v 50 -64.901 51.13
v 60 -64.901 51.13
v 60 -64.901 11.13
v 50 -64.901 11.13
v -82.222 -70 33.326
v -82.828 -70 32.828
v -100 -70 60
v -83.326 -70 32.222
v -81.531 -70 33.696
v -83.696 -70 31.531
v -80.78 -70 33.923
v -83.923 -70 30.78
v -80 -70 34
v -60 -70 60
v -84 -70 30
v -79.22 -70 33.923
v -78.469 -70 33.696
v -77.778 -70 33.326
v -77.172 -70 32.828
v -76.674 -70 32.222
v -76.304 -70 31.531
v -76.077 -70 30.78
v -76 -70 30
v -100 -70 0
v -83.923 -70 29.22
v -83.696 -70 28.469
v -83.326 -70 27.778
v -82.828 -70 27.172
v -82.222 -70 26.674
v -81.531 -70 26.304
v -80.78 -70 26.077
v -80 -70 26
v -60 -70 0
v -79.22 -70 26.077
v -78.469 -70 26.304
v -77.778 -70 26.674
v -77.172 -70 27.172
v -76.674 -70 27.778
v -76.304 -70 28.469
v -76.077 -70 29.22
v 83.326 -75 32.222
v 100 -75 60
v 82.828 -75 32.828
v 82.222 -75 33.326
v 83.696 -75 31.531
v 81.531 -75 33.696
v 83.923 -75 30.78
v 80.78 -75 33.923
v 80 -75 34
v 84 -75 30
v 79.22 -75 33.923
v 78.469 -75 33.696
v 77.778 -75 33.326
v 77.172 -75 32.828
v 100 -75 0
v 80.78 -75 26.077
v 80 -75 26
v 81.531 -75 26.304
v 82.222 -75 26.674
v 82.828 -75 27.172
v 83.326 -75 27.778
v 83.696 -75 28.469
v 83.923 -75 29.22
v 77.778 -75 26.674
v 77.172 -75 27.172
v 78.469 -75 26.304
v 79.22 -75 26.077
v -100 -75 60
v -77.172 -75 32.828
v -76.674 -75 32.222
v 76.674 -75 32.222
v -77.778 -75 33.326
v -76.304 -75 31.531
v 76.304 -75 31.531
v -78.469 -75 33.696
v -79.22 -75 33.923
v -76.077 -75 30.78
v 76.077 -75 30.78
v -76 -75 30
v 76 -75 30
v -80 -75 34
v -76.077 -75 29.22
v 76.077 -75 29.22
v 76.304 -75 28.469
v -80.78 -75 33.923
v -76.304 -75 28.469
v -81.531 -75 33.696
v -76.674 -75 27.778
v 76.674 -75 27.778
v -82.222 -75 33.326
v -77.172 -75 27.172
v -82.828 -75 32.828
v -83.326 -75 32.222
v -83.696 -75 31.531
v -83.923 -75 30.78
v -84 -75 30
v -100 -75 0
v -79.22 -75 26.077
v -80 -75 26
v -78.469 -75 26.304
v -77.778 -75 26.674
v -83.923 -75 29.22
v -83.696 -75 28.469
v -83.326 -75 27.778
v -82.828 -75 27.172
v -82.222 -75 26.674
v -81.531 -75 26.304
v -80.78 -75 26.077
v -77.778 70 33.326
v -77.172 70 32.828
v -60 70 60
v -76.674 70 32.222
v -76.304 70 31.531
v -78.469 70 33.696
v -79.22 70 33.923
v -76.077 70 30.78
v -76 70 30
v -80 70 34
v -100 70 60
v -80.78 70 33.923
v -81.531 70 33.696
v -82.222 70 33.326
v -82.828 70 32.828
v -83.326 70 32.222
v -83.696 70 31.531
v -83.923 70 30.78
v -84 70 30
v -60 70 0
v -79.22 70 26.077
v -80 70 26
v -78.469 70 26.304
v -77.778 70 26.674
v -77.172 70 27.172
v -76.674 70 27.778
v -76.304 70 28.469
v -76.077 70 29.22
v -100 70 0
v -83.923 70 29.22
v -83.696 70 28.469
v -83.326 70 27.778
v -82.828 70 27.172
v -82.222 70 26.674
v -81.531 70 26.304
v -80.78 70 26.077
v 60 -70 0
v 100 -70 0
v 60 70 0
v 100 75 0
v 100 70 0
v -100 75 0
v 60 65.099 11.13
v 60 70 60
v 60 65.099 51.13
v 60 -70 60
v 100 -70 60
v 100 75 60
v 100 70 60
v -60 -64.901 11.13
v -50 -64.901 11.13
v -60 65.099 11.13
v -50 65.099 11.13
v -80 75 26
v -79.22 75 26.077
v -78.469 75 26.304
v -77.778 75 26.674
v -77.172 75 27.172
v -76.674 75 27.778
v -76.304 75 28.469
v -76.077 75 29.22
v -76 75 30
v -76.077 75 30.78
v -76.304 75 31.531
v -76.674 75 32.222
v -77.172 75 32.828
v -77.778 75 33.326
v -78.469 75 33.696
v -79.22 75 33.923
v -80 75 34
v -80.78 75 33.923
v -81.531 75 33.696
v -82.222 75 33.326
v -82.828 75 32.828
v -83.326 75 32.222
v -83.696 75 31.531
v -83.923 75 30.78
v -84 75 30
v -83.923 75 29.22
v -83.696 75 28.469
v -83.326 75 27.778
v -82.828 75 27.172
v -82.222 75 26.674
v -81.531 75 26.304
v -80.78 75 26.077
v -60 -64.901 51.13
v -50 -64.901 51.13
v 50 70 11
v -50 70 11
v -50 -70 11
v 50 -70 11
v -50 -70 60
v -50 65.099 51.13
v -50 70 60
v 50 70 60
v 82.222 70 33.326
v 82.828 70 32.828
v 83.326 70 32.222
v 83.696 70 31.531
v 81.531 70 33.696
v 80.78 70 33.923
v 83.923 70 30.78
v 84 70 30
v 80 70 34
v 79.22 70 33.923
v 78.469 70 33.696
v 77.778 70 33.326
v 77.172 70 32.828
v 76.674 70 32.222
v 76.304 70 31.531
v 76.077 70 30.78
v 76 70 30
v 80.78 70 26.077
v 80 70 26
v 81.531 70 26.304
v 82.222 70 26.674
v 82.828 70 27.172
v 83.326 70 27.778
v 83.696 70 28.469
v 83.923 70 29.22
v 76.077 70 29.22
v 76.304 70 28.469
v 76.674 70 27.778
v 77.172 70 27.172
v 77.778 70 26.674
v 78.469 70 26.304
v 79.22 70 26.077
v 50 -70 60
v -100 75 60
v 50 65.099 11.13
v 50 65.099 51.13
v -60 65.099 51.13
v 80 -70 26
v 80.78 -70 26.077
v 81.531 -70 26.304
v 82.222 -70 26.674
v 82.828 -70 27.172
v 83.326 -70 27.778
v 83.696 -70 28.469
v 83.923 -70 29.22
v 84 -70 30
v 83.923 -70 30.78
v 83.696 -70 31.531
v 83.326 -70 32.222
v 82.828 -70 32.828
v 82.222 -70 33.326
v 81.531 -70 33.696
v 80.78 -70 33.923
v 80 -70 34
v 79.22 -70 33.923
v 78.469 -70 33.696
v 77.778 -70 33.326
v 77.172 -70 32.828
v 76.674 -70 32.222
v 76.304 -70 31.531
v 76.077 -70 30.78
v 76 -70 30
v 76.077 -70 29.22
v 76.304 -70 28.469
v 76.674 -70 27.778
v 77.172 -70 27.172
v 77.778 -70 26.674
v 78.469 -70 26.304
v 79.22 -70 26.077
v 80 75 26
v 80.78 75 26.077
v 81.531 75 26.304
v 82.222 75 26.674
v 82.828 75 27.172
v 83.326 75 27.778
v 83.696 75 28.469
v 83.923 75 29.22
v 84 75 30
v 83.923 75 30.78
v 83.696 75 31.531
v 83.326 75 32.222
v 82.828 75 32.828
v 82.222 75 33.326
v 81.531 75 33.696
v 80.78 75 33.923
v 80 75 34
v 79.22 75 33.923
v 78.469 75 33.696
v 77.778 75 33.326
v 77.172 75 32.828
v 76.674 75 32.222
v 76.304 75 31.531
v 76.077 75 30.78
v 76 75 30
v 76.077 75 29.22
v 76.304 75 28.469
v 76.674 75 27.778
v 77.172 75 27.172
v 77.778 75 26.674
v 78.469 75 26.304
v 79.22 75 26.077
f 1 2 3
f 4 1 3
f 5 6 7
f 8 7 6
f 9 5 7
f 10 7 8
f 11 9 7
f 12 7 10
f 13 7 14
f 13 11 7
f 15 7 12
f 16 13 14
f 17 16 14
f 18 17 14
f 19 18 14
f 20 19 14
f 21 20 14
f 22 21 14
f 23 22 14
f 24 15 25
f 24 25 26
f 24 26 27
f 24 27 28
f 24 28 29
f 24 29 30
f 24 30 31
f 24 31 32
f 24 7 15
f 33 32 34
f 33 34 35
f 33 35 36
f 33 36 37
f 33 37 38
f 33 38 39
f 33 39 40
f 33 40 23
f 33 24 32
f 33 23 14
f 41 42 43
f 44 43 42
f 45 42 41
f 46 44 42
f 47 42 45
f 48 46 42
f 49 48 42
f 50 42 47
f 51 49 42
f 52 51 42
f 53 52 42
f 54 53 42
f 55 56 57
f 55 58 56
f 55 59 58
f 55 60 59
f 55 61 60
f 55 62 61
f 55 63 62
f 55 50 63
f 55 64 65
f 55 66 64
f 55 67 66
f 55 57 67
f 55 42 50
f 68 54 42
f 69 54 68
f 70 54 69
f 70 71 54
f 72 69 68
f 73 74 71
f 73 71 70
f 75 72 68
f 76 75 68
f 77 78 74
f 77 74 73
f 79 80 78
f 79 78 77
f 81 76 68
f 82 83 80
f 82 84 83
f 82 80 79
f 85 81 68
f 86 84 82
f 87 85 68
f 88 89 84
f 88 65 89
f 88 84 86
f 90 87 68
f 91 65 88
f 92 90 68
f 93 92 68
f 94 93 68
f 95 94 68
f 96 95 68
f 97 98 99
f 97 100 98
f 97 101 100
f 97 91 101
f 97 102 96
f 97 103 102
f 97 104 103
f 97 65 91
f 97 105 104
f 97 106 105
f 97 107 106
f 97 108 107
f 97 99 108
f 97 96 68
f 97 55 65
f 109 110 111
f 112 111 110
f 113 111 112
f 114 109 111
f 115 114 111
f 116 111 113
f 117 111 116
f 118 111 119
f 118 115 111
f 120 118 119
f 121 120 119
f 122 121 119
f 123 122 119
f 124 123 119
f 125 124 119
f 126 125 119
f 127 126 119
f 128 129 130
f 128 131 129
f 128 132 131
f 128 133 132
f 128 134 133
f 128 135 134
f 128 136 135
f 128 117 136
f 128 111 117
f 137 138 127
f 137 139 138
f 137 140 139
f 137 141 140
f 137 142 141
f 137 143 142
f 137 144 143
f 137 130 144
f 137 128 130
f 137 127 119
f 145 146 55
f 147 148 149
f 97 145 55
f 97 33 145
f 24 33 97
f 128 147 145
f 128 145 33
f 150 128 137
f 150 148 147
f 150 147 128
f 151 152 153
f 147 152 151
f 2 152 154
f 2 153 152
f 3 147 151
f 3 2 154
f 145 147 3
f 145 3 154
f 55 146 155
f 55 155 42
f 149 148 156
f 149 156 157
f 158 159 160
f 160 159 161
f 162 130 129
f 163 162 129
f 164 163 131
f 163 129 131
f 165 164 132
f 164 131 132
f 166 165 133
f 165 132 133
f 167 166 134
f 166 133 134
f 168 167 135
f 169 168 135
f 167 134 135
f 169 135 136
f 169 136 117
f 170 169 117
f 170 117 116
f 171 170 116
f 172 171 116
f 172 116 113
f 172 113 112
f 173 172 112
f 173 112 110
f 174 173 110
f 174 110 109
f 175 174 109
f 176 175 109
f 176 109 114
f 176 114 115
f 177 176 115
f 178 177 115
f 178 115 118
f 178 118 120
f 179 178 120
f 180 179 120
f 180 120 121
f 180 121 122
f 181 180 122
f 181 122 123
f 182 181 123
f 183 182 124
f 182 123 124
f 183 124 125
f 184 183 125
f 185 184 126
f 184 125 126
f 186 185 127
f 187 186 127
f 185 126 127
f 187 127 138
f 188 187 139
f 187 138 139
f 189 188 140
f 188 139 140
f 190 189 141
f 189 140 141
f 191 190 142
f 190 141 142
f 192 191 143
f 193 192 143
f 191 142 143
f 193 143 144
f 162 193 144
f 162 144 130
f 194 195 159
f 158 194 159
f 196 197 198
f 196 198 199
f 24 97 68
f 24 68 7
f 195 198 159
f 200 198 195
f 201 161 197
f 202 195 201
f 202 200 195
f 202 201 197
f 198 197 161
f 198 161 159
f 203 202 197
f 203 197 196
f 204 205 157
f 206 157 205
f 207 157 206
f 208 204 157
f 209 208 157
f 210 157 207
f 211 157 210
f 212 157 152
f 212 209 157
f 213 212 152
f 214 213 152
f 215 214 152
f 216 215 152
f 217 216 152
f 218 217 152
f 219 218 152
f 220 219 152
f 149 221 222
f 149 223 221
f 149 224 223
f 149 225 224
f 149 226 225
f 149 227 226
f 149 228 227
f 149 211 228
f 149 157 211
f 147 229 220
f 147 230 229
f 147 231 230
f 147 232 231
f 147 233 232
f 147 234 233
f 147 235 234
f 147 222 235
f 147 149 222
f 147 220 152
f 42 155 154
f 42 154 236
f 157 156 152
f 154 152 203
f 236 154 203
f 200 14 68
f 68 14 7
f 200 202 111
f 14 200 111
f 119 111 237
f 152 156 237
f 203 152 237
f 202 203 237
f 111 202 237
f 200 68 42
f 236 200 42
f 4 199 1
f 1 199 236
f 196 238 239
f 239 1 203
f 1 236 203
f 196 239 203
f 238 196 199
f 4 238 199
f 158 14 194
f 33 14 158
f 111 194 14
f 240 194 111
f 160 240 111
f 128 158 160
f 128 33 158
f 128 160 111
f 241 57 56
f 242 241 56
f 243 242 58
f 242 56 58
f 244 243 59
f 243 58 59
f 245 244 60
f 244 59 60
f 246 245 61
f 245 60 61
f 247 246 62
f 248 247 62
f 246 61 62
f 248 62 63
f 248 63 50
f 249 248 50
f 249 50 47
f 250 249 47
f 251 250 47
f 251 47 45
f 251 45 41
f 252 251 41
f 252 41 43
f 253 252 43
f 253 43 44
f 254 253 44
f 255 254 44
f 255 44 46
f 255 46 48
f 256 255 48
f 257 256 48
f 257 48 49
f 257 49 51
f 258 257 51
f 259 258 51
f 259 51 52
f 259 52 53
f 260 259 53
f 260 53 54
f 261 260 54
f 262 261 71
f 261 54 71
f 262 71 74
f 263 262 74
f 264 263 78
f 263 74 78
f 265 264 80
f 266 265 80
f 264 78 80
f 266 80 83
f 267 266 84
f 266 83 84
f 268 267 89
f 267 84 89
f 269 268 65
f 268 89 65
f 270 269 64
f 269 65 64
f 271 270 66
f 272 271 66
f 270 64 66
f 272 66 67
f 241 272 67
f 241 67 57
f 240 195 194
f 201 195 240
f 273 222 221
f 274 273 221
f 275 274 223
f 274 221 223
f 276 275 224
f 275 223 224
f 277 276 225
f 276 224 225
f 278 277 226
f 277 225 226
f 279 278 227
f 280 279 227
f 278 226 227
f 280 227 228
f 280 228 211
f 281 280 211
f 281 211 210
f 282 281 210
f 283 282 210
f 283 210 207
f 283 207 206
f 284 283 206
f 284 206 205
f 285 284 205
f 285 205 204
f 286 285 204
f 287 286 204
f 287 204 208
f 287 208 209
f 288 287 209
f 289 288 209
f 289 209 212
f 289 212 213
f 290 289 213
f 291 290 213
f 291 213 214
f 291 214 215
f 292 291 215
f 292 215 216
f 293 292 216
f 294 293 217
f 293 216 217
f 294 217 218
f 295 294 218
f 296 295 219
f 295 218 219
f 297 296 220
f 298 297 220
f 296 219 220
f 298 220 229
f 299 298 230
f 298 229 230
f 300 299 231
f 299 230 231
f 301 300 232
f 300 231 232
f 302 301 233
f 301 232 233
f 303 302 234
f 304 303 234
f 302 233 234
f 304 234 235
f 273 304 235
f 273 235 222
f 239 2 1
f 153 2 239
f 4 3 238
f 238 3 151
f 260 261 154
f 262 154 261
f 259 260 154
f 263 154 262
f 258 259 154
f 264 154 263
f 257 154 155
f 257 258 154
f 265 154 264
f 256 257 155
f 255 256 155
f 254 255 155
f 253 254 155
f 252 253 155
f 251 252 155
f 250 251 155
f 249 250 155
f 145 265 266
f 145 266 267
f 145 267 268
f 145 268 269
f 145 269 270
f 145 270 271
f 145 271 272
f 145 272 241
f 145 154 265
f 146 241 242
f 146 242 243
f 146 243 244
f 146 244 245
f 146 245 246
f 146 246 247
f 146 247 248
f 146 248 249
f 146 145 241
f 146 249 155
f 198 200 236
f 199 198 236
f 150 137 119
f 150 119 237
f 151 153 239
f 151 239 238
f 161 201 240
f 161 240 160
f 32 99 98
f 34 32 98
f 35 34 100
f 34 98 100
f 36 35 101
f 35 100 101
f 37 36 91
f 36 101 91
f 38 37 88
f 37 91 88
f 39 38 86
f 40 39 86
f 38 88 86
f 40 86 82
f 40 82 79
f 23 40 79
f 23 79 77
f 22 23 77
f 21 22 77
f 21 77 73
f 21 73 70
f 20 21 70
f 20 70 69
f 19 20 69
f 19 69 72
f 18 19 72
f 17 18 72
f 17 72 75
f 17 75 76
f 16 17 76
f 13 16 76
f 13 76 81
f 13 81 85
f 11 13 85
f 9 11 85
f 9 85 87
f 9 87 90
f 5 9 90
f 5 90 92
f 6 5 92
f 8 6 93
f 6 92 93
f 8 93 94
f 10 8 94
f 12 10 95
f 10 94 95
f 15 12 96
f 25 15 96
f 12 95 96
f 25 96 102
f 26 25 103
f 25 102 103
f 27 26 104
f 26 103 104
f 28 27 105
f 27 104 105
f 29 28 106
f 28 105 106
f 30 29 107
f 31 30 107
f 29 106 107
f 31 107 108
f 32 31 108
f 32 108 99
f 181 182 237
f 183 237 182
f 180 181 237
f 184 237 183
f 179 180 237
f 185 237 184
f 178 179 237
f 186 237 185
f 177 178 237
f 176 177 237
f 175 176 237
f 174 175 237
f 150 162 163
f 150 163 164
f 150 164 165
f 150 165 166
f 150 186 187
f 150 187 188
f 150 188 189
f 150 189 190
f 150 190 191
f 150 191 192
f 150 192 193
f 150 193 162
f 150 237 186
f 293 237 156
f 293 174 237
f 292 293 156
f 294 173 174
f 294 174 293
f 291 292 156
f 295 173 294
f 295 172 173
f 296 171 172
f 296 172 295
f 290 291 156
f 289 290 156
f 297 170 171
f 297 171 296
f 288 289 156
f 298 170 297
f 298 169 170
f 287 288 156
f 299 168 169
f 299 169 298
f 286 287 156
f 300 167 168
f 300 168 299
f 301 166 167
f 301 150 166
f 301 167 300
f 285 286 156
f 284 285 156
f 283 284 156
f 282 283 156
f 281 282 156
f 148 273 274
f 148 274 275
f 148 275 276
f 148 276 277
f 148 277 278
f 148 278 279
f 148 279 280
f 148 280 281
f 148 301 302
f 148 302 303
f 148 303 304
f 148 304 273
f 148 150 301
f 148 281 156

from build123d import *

# Parameters (mm, degrees)
EXTRUDE_1_DEPTH     = 60
SKETCH_2_W          = 40
SKETCH_2_H          = 130
CUT_EXTRUDE_1_DEPTH = 136
SKETCH_3_W          = 100
SKETCH_3_H          = 140
CUT_EXTRUDE_2_DEPTH = 49
SKETCH_4_R          = 4
CUT_EXTRUDE_3_DEPTH = 198


with BuildPart() as part:
    # 草图1 → 凸台-拉伸1 (new body)
    with BuildSketch(Plane.XY):
        Polygon((-100, 75), (100, 75), (100, 70), (60, 70), (60, -70), (100, -70), (100, -75), (-100, -75), (-100, -70), (-60, -70), (-60, 70), (-100, 70), align=None)
    extrude(amount=EXTRUDE_1_DEPTH)

    # 草图2 → 切除-拉伸1 (cut)
    with BuildSketch(Plane(origin=(60, 0, 0), x_dir=(0, 0, -1), z_dir=(1, 0, 0))):
        with Locations((-31.130418395, 0.098831956)):
            Rectangle(SKETCH_2_W, SKETCH_2_H)
    extrude(amount=-CUT_EXTRUDE_1_DEPTH, mode=Mode.SUBTRACT)

    # 草图3 → 切除-拉伸2 (cut)
    with BuildSketch(Plane.XY.offset(60)):
        Rectangle(SKETCH_3_W, SKETCH_3_H)
    extrude(amount=-CUT_EXTRUDE_2_DEPTH, mode=Mode.SUBTRACT)

    # 草图4 → 切除-拉伸3 (cut)
    with BuildSketch(Plane.XZ.offset(75)):
        with Locations(Location((-80, 30, 0), (0, 0, 270))):
            Circle(SKETCH_4_R)
        with Locations(Location((80, 30, 0), (0, 0, 270))):
            Circle(SKETCH_4_R)
    extrude(amount=-CUT_EXTRUDE_3_DEPTH, mode=Mode.SUBTRACT)


solid = part.part
